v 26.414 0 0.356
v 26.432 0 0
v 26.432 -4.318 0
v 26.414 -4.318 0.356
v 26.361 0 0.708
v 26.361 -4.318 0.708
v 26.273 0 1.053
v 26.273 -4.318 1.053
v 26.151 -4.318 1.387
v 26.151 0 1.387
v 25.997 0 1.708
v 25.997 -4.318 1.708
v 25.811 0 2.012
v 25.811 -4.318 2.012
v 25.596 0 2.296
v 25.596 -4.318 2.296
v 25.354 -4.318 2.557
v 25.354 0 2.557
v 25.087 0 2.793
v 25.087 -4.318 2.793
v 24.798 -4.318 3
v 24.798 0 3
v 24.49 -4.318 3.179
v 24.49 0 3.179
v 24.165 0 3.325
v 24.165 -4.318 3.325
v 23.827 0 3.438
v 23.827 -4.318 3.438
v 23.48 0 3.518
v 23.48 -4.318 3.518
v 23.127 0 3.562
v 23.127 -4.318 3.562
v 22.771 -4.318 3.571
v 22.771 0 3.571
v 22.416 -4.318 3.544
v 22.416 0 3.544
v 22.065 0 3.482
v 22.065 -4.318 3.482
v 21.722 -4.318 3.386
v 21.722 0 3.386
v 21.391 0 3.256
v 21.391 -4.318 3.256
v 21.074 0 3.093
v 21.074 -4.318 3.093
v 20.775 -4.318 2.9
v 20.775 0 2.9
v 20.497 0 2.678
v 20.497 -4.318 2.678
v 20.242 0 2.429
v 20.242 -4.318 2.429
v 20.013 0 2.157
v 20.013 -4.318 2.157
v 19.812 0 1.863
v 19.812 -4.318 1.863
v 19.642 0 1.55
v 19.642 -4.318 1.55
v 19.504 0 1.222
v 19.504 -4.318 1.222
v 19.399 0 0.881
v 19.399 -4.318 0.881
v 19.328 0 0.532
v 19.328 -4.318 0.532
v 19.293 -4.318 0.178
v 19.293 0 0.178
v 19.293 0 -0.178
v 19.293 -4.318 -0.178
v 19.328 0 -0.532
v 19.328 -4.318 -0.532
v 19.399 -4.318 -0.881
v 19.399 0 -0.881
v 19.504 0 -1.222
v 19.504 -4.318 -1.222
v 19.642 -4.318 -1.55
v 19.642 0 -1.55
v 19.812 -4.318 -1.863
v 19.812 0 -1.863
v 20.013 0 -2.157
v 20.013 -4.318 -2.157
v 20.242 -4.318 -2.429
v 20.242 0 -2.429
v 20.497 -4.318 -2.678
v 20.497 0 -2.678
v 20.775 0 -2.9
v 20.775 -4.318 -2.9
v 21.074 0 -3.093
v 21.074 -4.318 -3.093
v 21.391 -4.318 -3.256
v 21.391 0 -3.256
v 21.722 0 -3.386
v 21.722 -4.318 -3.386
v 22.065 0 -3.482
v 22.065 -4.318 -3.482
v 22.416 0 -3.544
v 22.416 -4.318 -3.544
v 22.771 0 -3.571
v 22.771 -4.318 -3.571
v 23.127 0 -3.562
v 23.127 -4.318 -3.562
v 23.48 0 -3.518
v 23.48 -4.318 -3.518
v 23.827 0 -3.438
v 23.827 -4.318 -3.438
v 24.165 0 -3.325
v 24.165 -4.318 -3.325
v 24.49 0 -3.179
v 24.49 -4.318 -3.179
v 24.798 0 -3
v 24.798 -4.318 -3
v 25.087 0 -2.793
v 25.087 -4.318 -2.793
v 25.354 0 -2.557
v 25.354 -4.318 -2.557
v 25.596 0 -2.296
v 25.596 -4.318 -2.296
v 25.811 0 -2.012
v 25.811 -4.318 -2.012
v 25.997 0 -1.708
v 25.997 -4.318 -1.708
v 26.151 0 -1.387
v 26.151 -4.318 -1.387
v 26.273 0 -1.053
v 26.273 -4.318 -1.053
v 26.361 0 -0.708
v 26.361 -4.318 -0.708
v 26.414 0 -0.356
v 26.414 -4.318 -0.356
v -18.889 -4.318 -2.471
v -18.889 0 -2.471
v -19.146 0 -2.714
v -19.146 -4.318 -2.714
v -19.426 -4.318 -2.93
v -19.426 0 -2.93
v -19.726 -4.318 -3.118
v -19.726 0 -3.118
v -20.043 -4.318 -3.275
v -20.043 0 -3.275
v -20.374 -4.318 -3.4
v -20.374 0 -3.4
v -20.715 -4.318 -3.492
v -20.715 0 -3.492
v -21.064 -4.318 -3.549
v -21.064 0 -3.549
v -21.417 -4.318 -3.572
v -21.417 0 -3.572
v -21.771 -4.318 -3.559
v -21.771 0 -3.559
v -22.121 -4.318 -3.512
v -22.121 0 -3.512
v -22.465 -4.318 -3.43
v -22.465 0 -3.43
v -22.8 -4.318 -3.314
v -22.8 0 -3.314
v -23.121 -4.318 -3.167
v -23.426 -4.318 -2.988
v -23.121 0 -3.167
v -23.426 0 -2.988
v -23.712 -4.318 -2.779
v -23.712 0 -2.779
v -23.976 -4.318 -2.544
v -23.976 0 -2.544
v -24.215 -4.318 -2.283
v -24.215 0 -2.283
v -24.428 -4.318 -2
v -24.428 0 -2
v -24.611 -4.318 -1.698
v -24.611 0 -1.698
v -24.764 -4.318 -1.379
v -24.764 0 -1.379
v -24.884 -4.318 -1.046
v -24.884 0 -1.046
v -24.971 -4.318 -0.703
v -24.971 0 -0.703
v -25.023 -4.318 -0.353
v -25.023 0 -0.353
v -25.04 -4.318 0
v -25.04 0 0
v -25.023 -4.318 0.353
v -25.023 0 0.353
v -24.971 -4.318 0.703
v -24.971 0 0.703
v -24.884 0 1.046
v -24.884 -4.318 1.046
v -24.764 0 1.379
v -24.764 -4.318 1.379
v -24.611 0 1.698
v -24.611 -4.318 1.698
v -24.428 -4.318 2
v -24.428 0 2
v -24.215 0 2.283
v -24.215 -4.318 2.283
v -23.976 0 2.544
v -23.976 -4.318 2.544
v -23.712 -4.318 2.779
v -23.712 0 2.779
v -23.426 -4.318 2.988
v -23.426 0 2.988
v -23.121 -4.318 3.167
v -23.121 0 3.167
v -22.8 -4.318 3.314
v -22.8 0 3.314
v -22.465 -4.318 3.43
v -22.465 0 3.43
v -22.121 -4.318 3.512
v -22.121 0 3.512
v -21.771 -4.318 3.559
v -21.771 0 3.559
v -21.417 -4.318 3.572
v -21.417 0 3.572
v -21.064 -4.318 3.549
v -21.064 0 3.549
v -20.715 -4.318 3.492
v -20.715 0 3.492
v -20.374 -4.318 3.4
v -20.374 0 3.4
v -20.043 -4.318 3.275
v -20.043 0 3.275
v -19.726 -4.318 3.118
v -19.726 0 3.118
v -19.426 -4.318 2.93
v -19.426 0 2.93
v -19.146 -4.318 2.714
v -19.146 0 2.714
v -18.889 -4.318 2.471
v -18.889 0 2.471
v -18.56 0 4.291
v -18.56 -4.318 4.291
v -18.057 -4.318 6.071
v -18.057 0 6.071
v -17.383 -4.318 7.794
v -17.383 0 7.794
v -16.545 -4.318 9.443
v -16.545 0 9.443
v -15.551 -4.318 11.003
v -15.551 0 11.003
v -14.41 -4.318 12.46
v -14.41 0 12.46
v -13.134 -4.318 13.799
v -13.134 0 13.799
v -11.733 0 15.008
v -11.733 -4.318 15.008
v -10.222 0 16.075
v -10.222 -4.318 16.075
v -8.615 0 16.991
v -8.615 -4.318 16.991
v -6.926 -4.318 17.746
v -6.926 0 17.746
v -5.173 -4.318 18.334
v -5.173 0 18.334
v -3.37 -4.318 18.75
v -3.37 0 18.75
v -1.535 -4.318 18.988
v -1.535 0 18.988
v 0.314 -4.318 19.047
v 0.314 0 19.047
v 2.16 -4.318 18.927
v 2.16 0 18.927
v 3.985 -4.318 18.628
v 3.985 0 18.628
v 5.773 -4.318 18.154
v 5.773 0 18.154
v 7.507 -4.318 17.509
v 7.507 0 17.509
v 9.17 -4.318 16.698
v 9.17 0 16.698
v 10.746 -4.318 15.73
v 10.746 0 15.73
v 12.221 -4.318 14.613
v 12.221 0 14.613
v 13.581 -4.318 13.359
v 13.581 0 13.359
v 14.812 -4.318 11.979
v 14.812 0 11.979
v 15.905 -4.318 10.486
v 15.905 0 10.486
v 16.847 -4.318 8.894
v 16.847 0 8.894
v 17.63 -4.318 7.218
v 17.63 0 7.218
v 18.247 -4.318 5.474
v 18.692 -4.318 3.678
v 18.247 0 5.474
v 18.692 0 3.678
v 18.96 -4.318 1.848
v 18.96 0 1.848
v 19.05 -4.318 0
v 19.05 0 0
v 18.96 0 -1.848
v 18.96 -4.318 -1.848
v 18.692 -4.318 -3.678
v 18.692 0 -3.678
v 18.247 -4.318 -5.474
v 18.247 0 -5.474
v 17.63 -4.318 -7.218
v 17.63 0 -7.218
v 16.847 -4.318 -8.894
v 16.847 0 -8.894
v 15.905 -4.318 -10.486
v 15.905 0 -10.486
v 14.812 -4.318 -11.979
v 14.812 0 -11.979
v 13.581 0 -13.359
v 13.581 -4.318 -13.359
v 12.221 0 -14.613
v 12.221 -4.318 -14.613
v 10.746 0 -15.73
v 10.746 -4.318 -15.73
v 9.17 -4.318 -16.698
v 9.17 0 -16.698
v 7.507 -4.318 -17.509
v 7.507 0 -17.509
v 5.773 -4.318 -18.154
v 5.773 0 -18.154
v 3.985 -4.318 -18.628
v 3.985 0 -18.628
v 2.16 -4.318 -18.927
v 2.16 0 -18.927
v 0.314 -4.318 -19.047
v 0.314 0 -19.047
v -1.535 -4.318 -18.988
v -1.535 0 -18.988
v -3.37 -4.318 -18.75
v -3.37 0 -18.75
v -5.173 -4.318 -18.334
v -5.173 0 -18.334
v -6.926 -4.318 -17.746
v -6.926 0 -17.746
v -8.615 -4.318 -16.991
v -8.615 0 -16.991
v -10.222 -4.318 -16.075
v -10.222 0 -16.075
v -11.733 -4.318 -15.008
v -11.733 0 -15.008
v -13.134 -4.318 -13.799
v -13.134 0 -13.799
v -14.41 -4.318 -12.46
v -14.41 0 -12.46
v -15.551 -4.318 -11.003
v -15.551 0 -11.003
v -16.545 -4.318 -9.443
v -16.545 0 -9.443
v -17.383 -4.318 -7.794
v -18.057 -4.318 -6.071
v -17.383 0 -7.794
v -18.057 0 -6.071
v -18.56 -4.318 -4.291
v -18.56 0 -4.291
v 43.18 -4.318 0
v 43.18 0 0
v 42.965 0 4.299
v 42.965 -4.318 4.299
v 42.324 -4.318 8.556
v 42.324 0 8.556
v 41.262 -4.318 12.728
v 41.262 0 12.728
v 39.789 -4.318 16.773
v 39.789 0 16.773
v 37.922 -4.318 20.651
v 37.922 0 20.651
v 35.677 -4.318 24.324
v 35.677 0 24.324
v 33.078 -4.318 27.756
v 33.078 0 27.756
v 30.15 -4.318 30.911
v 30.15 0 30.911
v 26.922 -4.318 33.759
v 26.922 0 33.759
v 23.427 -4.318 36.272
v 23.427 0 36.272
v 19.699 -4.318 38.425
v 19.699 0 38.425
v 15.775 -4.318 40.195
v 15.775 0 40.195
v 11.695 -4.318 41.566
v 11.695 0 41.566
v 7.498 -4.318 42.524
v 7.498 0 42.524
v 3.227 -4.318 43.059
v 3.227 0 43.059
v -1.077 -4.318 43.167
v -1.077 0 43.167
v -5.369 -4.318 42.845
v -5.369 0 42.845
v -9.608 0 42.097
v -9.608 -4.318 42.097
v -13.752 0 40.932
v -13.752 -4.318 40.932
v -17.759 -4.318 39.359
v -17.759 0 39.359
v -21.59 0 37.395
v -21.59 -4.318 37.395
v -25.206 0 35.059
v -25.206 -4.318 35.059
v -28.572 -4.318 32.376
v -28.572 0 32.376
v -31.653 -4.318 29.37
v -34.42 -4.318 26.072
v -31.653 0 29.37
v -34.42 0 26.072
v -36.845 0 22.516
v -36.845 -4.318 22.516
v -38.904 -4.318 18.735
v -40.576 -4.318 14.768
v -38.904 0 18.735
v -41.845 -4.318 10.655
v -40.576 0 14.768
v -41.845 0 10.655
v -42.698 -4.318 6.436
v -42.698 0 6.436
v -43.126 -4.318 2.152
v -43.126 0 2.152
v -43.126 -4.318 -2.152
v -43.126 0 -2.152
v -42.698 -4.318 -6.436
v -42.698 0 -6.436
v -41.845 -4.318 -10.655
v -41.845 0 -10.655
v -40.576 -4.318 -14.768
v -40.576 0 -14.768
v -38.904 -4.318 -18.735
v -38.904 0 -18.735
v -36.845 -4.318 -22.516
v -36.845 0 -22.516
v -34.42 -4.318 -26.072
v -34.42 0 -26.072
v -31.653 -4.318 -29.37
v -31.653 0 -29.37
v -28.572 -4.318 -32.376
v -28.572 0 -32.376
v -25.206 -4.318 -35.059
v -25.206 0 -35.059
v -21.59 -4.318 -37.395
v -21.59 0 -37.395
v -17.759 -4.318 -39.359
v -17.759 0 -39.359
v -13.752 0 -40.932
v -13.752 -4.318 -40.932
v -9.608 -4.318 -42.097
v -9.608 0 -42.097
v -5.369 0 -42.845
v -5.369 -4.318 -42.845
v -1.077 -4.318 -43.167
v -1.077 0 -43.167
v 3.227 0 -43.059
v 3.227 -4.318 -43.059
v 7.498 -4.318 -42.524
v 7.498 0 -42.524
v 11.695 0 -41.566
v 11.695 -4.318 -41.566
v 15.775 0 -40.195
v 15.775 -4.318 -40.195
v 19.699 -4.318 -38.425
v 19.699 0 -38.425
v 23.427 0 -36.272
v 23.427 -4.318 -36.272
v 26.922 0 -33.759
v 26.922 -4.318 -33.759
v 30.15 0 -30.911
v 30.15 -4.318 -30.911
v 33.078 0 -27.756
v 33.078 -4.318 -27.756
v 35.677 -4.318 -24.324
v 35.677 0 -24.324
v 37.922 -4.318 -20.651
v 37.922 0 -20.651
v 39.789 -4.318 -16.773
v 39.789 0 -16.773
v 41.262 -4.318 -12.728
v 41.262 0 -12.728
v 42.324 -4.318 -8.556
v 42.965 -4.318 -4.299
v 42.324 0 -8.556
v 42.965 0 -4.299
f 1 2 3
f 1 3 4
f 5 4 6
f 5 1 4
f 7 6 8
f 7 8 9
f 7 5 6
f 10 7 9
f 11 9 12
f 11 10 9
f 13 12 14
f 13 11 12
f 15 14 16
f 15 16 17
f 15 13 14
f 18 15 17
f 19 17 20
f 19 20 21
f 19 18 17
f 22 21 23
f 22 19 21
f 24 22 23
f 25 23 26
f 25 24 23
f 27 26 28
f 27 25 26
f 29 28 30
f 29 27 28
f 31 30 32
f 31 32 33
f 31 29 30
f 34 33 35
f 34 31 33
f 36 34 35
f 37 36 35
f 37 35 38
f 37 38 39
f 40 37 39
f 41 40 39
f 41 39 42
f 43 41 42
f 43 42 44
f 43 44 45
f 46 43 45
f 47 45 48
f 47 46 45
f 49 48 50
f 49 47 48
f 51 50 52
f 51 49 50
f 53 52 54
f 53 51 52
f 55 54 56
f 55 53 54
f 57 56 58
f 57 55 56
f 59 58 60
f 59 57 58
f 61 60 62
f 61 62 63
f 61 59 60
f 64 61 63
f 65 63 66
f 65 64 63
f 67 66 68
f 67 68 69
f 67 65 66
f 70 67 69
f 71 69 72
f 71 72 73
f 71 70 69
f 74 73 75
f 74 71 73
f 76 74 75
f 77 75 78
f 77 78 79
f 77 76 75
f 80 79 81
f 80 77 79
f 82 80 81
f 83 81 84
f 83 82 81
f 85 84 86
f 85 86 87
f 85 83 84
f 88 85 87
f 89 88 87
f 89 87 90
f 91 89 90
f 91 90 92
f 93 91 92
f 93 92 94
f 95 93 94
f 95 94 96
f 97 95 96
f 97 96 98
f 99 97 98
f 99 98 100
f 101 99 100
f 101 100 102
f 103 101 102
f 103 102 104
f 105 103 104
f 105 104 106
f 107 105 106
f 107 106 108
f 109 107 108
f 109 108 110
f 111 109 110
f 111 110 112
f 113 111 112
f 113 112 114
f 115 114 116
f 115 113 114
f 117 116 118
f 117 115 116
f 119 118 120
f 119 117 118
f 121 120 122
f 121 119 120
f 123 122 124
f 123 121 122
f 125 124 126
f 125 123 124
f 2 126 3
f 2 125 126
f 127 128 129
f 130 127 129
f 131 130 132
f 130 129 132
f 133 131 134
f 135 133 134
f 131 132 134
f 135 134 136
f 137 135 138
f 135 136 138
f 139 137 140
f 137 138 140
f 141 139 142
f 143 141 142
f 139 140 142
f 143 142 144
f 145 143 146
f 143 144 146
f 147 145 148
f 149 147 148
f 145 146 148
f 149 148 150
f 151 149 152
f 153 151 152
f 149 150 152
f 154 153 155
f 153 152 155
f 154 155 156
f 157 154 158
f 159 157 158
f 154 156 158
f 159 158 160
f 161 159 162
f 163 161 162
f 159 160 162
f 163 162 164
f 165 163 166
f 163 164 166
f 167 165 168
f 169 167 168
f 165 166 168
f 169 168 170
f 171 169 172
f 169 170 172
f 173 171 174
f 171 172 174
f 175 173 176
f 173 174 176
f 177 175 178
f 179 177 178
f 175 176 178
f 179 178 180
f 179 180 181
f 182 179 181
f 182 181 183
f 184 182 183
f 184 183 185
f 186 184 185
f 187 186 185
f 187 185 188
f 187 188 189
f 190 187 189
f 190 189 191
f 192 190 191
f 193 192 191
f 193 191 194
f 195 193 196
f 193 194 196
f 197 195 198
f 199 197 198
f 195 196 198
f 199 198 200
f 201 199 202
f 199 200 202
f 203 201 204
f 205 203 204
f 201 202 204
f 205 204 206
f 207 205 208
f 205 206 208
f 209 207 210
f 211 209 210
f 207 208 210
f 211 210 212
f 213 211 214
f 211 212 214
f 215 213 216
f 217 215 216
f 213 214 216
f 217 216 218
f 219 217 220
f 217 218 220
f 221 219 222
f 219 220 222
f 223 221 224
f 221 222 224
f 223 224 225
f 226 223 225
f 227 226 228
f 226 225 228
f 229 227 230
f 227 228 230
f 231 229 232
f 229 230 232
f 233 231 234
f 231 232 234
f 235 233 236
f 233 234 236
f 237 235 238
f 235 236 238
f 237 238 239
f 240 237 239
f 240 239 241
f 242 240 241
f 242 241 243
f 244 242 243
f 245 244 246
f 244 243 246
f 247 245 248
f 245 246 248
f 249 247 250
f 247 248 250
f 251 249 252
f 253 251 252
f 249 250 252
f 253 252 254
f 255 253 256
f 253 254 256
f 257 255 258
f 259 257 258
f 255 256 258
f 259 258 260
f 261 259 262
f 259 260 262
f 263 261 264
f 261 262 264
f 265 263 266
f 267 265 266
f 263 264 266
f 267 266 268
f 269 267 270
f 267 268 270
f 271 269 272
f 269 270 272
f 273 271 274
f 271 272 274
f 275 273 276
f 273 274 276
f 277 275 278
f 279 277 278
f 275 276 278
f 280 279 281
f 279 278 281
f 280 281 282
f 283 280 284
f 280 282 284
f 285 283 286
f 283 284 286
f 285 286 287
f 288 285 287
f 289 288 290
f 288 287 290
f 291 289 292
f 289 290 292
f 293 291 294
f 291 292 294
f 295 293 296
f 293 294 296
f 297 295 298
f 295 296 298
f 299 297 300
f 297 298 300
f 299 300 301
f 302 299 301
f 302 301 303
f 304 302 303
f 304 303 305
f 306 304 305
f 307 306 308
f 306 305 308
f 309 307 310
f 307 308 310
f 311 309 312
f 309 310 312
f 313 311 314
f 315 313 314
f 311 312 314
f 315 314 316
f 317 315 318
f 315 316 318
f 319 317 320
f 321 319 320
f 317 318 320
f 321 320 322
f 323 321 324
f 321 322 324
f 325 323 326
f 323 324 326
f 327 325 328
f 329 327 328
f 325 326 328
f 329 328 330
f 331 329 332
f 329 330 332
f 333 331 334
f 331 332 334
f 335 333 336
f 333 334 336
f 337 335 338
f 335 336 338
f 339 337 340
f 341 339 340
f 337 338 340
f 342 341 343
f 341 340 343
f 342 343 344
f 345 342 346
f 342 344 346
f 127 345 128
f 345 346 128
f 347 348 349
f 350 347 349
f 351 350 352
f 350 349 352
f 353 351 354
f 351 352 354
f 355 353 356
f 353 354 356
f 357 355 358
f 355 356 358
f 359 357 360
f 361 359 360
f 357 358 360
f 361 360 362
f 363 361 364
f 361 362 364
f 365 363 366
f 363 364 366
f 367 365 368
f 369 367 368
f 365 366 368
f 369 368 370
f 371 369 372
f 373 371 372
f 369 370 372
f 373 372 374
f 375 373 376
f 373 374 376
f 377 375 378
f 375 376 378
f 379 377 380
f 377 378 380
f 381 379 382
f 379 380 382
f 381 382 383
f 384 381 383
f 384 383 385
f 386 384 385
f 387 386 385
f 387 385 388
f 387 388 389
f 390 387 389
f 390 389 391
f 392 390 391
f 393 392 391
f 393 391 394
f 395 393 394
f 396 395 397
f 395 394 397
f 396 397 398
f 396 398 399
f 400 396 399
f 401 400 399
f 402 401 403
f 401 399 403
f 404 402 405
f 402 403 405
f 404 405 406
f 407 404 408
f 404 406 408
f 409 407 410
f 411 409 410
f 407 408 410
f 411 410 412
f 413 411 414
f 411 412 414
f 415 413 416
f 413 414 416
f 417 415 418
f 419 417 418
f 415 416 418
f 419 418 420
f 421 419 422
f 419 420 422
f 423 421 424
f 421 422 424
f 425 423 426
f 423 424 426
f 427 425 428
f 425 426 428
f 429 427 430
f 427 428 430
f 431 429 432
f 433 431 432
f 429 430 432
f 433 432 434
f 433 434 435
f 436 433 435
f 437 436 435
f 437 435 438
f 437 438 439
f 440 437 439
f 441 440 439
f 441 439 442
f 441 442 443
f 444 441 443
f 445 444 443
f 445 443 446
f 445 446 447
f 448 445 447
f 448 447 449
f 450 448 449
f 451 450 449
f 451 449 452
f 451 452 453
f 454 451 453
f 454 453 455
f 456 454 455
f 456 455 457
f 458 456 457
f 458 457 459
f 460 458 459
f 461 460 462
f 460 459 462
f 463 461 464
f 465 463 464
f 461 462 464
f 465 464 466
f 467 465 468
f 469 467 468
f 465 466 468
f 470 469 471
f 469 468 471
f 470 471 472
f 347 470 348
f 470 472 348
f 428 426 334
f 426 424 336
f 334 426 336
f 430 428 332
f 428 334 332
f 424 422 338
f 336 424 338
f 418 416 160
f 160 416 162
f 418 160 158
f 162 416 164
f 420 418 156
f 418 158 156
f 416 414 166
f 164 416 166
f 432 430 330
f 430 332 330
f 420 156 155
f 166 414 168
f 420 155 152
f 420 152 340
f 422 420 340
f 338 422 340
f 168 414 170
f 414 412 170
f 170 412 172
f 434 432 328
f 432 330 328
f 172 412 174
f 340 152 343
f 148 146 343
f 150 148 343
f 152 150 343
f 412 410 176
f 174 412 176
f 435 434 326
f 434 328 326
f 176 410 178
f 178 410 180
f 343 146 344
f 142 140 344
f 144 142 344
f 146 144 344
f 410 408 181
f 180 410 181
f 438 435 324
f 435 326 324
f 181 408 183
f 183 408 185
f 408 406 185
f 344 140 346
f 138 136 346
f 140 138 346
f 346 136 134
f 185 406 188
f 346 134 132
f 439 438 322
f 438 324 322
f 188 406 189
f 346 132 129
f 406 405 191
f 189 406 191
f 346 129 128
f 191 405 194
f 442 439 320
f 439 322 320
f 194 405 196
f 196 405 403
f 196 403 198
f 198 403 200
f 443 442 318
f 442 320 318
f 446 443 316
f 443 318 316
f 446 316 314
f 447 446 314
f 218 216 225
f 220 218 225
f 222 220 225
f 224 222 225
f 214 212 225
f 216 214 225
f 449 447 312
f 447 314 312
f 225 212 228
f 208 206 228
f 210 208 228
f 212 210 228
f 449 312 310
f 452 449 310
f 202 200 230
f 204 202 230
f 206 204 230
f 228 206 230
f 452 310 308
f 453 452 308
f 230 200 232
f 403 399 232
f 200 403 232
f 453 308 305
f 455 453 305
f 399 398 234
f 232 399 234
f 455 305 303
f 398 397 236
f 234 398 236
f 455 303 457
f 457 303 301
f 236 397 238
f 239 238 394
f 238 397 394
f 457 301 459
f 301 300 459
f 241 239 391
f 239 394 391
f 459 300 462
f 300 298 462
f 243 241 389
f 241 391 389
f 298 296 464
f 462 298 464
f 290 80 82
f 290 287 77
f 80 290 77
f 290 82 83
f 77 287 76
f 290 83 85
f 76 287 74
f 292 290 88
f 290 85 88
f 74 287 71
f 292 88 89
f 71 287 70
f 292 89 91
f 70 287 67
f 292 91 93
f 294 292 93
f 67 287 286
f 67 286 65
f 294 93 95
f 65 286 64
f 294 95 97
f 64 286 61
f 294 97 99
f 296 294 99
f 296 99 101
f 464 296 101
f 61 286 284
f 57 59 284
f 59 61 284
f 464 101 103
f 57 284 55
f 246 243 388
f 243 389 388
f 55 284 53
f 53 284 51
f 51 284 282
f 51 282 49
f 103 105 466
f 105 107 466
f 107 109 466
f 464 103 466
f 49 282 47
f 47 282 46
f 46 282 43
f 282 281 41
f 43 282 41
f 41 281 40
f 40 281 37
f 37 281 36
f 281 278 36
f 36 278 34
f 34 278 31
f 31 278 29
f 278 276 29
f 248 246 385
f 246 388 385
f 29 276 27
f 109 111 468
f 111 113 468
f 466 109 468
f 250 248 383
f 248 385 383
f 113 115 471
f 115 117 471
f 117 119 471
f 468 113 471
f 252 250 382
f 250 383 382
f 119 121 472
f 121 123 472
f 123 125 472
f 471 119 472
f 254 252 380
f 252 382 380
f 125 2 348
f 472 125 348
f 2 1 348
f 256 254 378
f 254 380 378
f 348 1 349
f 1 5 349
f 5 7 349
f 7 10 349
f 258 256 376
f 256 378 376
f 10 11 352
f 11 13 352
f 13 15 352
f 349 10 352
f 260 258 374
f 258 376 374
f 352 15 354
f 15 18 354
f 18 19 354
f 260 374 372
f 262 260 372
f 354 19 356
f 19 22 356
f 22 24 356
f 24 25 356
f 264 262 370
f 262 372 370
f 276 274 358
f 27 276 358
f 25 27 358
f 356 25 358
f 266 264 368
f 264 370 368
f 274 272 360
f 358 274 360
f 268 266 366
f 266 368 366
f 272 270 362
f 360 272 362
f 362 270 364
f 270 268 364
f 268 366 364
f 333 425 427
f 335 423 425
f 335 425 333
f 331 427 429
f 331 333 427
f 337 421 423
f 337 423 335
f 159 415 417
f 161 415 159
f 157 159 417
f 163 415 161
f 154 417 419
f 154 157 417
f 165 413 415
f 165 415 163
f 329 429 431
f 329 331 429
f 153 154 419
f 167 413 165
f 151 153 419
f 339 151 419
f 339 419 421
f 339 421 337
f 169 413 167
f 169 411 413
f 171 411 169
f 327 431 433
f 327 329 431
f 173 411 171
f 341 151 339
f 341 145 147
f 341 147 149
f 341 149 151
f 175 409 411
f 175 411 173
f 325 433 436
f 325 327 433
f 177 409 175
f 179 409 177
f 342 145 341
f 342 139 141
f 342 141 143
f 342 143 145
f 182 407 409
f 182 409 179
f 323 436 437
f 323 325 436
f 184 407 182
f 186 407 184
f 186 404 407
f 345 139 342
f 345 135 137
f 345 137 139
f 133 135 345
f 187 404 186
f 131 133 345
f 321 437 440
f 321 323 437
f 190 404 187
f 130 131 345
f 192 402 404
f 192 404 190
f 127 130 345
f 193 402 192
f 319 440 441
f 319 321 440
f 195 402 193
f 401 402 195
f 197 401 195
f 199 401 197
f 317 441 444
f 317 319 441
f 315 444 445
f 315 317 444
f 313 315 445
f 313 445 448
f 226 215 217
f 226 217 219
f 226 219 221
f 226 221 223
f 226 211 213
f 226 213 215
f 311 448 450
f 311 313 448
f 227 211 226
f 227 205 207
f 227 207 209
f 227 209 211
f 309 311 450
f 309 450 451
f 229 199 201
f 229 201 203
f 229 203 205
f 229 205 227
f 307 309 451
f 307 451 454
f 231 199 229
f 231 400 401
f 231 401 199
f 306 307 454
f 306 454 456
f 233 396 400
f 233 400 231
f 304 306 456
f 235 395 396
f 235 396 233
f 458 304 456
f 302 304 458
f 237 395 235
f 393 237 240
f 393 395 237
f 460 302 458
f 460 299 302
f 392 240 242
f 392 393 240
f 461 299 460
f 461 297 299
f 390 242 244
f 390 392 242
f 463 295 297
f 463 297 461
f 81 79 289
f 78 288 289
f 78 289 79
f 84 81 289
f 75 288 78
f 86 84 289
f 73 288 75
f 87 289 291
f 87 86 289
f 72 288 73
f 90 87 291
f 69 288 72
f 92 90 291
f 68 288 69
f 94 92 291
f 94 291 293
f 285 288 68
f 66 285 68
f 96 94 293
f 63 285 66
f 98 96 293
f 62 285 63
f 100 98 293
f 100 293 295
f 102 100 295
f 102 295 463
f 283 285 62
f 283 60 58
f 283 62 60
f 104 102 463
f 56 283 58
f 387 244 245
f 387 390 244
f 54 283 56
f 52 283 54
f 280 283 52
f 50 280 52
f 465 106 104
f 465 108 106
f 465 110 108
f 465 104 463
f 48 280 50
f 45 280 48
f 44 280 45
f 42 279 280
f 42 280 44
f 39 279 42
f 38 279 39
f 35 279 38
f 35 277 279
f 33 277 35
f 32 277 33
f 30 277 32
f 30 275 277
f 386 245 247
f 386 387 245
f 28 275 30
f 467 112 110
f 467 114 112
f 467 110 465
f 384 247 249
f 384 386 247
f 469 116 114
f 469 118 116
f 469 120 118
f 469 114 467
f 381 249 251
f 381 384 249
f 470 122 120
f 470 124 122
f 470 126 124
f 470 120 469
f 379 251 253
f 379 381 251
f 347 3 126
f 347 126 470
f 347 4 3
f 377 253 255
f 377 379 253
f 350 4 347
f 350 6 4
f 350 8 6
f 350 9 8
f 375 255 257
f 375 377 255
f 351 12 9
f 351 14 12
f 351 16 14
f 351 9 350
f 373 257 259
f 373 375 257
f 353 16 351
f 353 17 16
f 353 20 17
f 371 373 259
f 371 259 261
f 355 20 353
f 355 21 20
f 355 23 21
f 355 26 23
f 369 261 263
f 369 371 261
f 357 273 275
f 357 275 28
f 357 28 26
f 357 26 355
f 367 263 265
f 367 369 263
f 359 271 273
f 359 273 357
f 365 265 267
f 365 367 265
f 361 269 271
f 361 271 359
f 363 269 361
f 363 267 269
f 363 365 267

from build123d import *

# Parameters (mm, degrees)
F0_R     = 43.18
F0_R_2   = 3.571875
F1_DEPTH = 4.318


with BuildPart() as f1:
    # F0 (on Front) → F1 (new body)
    with BuildSketch(Plane.XZ):
        Circle(F0_R)
        with BuildLine():
            ThreePointArc((-18.889089, -2.470793), (-25.040397, 0), (-18.889089, 2.470793))
            ThreePointArc((-18.889089, 2.470793), (1.238013, 19.00973), (19.05, 0))
            ThreePointArc((19.05, 0), (1.238013, -19.00973), (-18.889089, -2.470793))
        make_face(mode=Mode.SUBTRACT)
        with Locations((22.86, 0)):
            Circle(F0_R_2, mode=Mode.SUBTRACT)
    extrude(amount=F1_DEPTH)


solid = f1.part
